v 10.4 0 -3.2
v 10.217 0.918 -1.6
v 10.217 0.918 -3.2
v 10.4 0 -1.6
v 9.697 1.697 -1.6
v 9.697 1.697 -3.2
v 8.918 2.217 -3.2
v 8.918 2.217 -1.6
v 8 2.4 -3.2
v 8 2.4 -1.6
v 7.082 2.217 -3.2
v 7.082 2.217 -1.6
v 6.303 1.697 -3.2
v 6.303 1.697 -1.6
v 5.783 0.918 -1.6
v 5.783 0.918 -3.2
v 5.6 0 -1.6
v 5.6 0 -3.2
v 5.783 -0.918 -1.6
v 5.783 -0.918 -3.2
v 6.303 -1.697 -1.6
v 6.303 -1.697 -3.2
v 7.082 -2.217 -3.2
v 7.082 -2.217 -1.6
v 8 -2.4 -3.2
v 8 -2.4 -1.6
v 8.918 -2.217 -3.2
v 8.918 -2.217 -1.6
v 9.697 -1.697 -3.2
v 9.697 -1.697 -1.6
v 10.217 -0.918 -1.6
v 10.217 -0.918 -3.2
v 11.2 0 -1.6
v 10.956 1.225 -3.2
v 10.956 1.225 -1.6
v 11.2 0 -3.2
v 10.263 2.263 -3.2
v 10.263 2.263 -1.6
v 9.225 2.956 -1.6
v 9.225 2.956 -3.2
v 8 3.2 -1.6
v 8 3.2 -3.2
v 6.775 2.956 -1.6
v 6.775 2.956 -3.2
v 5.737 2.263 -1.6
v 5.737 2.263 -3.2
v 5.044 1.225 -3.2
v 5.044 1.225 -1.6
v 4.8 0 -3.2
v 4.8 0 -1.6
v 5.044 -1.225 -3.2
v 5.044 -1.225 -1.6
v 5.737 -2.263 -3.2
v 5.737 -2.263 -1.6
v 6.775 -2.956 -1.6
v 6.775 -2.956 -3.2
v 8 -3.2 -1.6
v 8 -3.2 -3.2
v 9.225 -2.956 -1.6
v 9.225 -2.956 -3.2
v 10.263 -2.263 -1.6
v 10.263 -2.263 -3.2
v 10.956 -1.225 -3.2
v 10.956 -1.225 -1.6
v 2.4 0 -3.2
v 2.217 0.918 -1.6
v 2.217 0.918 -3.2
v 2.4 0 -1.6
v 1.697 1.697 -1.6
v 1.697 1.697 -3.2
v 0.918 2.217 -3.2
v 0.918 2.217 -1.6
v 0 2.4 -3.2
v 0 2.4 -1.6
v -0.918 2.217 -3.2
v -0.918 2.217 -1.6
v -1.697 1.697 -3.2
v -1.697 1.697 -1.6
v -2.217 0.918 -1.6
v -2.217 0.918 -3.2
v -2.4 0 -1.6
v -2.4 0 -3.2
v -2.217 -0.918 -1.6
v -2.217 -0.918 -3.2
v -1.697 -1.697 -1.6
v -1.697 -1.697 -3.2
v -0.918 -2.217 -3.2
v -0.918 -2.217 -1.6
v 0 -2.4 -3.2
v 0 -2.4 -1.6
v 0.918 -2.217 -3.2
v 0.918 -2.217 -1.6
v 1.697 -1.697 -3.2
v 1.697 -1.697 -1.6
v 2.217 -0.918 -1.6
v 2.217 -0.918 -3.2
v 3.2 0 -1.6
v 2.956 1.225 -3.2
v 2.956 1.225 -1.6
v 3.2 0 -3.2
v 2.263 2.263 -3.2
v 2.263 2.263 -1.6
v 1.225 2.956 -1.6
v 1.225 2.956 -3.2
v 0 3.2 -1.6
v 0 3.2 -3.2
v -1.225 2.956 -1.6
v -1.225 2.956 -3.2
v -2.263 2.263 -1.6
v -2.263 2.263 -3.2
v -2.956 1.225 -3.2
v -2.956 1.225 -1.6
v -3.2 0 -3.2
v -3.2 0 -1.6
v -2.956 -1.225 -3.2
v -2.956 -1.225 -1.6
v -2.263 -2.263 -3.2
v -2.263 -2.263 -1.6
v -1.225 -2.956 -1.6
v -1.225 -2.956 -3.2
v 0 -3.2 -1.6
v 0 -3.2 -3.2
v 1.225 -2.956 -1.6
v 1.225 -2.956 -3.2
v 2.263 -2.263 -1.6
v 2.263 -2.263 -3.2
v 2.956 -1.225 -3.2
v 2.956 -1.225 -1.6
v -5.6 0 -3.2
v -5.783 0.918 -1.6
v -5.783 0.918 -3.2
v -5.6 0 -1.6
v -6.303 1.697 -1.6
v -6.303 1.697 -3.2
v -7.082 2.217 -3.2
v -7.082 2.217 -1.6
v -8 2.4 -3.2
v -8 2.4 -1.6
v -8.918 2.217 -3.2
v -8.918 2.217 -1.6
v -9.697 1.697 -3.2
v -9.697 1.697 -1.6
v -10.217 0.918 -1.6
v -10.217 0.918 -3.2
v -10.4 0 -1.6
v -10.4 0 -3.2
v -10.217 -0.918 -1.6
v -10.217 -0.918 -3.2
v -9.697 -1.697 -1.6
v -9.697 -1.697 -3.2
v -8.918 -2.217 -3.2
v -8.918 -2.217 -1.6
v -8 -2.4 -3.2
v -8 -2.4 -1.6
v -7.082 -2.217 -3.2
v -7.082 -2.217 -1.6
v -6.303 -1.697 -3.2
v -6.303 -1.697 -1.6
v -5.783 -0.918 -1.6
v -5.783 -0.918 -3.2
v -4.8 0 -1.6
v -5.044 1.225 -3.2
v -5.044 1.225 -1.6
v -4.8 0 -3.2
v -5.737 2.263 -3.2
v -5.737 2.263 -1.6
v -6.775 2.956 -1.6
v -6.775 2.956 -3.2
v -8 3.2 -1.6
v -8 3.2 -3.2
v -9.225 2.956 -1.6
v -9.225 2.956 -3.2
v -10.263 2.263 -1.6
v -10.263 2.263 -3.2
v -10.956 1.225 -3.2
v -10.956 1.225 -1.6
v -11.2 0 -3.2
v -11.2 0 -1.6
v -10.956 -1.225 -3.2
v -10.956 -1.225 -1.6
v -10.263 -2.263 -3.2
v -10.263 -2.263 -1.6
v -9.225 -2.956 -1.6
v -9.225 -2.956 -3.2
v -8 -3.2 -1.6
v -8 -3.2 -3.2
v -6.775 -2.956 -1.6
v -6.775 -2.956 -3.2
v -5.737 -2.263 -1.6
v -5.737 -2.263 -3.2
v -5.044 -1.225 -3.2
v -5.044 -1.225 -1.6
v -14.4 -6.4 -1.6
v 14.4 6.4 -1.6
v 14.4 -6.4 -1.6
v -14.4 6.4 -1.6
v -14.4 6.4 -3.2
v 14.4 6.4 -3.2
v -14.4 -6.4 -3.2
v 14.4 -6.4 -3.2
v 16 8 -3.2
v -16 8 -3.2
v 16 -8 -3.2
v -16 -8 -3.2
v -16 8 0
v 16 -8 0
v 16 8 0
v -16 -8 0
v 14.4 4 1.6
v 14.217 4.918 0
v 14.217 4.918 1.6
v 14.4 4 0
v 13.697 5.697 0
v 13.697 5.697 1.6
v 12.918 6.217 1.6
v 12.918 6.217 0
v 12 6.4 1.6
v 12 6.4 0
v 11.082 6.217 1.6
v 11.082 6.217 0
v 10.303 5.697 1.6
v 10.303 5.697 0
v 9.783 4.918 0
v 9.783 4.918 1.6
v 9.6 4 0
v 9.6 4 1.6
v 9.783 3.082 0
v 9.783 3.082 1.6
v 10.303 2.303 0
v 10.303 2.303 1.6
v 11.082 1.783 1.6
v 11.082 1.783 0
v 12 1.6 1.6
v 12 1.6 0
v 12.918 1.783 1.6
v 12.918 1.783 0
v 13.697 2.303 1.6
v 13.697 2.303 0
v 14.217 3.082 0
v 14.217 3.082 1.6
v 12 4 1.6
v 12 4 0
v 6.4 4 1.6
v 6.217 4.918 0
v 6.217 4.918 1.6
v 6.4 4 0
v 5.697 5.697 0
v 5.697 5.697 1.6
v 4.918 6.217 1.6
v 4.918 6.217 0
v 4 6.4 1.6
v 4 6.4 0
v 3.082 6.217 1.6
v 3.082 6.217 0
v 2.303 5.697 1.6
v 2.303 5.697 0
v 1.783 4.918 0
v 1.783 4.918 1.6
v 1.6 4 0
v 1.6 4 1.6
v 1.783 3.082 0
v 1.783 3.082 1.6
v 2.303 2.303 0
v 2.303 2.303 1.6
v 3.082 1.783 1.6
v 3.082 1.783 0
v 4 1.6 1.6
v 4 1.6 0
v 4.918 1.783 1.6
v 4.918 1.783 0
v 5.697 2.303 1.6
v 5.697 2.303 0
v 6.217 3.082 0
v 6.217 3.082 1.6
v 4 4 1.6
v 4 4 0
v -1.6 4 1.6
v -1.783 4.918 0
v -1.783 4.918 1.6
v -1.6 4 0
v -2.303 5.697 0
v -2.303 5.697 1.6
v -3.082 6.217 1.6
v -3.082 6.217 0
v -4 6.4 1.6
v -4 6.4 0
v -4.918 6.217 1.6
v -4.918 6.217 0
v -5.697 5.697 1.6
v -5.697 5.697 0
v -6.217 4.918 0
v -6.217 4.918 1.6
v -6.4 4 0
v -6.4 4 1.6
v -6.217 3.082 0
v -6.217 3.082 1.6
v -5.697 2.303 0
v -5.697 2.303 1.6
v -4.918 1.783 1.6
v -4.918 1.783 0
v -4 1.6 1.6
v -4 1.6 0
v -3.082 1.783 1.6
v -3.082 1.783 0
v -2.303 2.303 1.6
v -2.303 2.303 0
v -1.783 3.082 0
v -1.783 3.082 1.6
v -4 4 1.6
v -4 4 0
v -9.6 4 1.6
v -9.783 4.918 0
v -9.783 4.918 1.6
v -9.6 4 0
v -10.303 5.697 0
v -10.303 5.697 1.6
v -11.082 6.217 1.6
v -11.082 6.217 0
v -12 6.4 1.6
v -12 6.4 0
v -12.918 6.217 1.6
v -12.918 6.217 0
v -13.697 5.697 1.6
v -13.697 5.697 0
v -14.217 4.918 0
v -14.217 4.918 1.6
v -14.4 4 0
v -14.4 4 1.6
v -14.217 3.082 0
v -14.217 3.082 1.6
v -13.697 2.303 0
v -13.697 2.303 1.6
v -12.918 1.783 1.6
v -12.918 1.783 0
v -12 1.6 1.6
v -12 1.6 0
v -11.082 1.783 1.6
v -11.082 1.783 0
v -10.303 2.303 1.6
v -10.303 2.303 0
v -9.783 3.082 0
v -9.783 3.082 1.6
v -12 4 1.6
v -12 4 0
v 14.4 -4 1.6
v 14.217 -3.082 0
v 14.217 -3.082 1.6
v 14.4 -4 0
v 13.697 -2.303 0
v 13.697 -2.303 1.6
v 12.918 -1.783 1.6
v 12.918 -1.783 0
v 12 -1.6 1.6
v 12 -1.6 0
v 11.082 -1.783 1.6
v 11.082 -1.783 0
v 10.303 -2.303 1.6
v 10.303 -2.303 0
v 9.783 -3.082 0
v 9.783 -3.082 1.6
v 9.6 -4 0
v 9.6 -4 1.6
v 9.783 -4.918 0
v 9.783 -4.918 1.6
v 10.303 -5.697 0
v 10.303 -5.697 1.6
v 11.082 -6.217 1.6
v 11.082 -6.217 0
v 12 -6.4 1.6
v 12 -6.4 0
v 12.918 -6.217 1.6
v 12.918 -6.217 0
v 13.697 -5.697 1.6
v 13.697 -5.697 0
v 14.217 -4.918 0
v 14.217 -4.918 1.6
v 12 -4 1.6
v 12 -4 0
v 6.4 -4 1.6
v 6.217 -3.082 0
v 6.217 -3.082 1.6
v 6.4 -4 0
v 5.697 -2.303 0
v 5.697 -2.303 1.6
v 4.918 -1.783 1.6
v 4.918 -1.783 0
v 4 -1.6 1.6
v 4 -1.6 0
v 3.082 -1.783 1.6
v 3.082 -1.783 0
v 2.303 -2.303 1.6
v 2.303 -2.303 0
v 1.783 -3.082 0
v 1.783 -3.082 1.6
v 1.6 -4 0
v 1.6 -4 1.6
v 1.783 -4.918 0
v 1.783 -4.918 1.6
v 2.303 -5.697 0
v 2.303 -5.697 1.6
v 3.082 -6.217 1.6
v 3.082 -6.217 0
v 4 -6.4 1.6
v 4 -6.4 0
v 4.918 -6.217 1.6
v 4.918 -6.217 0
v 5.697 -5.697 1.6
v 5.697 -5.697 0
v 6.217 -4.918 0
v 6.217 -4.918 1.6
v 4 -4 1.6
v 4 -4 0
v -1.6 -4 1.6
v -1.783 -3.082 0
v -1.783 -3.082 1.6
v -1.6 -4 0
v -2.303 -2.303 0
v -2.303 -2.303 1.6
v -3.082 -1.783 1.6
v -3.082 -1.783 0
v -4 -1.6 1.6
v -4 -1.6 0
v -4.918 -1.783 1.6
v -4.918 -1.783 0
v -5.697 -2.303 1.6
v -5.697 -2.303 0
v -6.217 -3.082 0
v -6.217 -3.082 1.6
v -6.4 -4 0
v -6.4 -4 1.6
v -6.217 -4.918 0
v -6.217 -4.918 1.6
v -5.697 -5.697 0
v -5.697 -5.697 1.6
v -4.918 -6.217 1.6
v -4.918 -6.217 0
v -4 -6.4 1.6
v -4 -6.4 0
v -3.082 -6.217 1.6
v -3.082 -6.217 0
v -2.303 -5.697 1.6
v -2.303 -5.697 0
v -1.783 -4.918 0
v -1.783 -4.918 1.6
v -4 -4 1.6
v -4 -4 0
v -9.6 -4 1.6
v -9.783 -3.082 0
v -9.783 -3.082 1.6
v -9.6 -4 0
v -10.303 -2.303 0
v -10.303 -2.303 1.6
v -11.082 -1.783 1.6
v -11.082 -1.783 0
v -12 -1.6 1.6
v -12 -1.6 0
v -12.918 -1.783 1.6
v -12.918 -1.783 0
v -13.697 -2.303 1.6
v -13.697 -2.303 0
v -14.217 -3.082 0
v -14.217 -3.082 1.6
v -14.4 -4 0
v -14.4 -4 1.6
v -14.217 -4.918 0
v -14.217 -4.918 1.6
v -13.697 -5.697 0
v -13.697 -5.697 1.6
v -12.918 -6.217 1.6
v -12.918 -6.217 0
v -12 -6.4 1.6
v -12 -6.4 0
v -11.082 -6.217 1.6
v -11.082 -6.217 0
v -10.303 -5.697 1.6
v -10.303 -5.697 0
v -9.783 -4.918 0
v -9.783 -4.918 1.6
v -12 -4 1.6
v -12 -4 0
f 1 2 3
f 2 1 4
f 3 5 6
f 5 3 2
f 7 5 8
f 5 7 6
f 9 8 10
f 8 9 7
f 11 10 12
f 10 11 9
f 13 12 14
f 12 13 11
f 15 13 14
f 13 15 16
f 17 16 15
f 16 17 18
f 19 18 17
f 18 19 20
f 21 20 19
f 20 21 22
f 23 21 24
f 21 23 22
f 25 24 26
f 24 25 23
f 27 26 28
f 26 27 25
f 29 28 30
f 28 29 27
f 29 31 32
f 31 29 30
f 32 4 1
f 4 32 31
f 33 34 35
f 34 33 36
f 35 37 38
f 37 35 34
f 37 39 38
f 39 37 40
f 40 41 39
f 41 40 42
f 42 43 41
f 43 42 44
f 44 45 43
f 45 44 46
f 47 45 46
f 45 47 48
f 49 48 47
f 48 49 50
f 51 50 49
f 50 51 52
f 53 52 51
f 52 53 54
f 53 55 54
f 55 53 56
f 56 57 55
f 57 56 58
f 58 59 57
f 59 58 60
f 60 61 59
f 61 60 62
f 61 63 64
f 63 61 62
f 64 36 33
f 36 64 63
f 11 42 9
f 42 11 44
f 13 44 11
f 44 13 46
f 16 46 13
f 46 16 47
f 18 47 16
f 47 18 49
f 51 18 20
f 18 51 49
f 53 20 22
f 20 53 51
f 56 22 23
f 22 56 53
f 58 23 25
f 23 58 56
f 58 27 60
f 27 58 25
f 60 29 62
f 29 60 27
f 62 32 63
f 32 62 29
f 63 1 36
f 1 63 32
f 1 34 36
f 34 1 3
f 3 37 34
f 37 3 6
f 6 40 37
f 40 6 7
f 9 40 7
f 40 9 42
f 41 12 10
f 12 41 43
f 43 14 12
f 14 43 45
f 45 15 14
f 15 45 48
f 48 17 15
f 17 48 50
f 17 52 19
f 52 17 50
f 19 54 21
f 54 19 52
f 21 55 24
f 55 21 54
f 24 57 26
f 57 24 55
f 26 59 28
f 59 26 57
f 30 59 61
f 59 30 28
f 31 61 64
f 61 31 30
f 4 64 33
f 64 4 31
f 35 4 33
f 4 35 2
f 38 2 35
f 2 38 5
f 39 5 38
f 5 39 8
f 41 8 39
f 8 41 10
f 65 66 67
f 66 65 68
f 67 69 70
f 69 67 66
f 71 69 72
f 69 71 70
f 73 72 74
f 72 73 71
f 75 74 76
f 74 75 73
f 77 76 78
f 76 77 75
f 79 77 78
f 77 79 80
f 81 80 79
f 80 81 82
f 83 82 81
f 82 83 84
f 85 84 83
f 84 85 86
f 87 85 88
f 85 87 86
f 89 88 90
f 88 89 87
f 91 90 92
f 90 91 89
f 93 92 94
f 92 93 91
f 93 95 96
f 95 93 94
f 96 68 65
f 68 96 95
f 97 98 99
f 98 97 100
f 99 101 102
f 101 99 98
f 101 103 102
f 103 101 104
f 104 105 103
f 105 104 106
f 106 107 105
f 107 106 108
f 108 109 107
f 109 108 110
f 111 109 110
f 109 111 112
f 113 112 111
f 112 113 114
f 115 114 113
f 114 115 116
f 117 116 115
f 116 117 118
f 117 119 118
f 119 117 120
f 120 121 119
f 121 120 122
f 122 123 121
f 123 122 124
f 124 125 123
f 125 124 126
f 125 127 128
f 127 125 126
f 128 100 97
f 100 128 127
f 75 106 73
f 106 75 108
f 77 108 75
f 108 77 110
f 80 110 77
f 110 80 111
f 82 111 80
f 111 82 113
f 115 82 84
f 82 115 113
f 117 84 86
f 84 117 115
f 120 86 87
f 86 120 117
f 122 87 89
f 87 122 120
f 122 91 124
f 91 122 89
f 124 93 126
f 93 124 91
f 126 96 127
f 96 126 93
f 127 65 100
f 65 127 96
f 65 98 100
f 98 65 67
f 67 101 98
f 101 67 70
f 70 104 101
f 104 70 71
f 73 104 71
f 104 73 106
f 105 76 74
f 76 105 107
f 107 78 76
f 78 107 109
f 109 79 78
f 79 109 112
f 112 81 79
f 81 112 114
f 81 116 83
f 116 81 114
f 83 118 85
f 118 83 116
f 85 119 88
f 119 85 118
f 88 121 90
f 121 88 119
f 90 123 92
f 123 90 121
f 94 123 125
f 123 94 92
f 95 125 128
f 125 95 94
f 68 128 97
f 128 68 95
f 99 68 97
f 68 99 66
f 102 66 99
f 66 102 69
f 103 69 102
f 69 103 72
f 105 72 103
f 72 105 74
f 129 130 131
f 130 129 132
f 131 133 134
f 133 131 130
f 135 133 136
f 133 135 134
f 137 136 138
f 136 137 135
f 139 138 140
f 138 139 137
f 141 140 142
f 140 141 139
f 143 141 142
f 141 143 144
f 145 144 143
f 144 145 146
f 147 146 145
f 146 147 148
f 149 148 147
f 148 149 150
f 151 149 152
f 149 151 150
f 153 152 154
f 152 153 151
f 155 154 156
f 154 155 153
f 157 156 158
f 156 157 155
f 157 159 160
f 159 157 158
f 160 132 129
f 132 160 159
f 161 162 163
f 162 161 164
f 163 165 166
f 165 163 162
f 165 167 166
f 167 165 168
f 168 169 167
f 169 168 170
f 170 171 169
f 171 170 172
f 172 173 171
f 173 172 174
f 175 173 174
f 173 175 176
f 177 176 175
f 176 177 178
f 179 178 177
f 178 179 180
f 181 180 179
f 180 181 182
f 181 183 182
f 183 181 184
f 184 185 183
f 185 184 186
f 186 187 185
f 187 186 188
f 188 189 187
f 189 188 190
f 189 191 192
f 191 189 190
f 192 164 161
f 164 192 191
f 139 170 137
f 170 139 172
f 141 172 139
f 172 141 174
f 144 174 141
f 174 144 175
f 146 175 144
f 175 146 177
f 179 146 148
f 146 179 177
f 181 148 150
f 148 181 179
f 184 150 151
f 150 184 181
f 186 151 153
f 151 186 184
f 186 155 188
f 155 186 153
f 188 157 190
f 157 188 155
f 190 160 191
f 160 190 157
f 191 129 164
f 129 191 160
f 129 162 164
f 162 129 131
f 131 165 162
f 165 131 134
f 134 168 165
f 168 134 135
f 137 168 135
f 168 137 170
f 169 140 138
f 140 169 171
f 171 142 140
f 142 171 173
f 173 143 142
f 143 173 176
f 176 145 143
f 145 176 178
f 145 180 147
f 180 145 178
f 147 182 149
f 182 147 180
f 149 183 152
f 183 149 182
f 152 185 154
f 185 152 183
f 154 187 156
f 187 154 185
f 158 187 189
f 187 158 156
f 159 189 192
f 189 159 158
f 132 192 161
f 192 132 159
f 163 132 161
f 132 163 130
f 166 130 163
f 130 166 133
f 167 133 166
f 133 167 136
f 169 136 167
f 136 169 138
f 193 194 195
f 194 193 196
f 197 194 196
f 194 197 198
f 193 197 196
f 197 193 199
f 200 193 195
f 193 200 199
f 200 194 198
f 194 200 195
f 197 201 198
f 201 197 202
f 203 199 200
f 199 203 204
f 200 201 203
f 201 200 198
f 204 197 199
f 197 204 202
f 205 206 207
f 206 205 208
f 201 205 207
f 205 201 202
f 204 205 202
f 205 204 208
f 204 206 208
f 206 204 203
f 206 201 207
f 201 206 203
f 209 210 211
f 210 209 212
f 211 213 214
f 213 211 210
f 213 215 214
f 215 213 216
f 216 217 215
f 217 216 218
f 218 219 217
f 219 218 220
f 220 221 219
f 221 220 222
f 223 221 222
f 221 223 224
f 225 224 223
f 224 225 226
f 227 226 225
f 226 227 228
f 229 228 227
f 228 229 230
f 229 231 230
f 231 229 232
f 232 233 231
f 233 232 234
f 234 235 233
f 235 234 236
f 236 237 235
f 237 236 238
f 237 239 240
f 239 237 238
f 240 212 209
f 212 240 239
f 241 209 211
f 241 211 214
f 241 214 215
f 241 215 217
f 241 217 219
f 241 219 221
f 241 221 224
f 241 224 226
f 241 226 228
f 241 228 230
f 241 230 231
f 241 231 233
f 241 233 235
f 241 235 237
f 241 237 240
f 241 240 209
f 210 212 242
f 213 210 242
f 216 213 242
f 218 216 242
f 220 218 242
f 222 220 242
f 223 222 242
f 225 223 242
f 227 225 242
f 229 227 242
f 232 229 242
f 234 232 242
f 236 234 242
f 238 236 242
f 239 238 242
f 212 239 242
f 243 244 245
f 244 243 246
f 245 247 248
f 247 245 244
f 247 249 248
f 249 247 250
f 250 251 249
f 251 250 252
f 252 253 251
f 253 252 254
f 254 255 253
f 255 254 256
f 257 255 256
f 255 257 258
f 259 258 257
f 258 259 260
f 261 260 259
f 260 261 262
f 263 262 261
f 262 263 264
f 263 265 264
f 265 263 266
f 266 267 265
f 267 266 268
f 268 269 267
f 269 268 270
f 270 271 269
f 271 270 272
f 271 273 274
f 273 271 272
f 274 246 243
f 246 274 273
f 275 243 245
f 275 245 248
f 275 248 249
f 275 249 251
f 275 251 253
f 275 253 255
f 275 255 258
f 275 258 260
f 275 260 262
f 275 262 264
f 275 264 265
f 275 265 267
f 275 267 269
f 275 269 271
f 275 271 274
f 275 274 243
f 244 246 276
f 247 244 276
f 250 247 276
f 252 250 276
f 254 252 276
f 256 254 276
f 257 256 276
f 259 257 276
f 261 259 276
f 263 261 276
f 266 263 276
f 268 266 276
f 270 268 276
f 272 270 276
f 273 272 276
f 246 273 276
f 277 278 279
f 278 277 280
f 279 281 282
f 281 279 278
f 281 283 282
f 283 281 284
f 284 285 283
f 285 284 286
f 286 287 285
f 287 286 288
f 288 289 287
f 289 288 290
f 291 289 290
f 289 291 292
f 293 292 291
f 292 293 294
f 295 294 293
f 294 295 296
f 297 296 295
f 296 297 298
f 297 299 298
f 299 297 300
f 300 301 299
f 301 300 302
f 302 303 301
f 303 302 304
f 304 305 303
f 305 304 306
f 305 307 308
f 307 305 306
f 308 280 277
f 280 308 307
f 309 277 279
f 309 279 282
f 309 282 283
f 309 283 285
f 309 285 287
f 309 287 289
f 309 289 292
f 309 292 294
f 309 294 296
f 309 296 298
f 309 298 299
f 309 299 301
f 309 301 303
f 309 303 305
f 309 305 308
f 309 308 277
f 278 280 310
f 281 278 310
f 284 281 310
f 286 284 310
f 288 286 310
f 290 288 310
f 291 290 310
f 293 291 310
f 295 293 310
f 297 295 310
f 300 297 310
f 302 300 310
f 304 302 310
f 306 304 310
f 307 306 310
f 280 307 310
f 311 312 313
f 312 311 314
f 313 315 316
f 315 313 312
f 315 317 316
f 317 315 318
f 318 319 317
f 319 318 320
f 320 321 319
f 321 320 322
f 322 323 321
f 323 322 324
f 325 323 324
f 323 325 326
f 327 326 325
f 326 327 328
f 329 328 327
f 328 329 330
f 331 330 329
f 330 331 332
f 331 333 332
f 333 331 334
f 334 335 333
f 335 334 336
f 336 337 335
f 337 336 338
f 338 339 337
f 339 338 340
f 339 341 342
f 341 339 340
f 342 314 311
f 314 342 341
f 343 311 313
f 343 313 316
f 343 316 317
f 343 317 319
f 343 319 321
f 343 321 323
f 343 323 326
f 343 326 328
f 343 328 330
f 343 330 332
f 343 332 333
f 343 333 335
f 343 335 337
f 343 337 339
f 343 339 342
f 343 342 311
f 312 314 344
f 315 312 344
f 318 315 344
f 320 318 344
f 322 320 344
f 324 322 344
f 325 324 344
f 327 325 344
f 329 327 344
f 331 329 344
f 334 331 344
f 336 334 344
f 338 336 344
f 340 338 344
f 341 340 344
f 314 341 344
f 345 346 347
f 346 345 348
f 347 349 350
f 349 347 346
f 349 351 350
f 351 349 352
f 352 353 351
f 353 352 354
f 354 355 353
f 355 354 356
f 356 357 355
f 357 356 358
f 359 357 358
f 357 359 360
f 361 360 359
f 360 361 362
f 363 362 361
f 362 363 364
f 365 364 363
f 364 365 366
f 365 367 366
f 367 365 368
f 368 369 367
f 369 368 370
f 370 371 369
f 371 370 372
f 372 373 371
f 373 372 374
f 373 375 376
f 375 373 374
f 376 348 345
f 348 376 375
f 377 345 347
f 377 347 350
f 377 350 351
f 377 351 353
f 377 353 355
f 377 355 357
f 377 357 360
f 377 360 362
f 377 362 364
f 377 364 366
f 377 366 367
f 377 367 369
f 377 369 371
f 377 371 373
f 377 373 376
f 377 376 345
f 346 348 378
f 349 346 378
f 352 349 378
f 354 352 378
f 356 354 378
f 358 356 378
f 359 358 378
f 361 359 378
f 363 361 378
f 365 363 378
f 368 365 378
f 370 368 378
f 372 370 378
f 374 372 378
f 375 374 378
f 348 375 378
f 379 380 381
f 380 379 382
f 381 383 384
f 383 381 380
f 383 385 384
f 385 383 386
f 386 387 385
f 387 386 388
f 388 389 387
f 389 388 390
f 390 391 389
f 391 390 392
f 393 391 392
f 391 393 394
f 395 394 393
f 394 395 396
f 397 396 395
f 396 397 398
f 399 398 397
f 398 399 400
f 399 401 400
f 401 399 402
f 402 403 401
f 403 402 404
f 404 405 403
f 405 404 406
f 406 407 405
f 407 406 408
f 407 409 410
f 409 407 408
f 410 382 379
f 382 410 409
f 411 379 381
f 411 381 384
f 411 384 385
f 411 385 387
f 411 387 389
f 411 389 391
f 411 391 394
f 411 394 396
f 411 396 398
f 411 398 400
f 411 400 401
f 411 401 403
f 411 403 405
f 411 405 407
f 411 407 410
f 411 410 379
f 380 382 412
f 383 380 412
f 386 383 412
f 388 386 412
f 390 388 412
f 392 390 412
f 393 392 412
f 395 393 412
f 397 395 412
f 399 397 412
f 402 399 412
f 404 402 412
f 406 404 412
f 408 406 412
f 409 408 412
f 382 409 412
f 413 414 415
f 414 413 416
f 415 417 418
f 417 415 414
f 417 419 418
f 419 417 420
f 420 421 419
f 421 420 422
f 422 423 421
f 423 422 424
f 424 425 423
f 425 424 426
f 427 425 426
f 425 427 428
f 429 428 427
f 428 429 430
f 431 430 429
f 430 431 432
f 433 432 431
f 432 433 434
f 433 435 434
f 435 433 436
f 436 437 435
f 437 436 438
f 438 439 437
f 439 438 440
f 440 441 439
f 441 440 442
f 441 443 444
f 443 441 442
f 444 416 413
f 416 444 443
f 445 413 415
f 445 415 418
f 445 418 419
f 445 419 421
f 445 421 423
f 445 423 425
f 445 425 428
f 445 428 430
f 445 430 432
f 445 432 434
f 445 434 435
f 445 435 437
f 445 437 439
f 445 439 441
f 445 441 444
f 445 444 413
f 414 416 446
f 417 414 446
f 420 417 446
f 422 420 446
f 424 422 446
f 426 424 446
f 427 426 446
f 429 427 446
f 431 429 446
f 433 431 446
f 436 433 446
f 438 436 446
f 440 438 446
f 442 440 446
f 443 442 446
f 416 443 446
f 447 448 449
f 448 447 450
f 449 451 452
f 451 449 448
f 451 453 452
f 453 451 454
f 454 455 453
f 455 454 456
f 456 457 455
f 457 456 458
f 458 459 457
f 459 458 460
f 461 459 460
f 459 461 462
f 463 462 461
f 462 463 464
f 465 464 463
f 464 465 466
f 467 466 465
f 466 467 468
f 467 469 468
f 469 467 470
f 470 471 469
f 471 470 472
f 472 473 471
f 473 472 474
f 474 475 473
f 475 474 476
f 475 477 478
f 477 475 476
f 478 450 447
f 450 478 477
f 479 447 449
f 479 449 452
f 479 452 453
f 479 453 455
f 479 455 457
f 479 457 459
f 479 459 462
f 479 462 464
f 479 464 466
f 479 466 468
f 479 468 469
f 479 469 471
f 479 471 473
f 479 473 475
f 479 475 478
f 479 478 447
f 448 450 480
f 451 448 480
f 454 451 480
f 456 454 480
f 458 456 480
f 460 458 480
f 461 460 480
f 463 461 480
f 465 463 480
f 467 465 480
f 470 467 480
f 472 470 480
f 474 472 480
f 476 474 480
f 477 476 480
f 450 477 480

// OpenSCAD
// file: ../p/4-4ring3.scad
use <../lib.scad>
$fa=1; $fs=0.2;
function ldraw_lib__4_4ring3(realsolid=false) = [
// 0 Ring  3 x 1.0
// 0 Name: 4-4ring3.dat
// 0 Author: James Jessiman
// 0 !LDRAW_ORG Primitive UPDATE 2009-01
// 0 !LICENSE Licensed under CC BY 2.0 and CC BY 4.0 : see CAreadme.txt
// 
// 0 BFC CERTIFY CCW
  [0,"BFC","CERTIFY"],
  [0,"BFC","CCW"],
// 
// 0 !HISTORY 1998-12-15 [PTadmin] Official Update 1998-10
// 0 !HISTORY 2002-04-05 [hafhead] Added BFC statement
// 0 !HISTORY 2002-04-25 [PTadmin] Official Update 2002-02
// 0 !HISTORY 2007-06-24 [PTadmin] Header formatted for Contributor Agreement
// 0 !HISTORY 2008-07-01 [PTadmin] Official Update 2008-01
// 0 !HISTORY 2008-08-26 [cwdee] Switch polygon winding and rename
// 0 !HISTORY 2009-05-02 [PTadmin] Official Update 2009-01
// 
// 
// 4 16 -1.5308 0 3.6956 -1.1481 0 2.7717 0 0 3 0 0 4
  [4,16,-1.5308,0,3.6956,-1.1481,0,2.7717,0,0,3,0,0,4],
// 4 16 -2.8284 0 2.8284 -2.1213 0 2.1213 -1.1481 0 2.7717 -1.5308 0 3.6956
  [4,16,-2.8284,0,2.8284,-2.1213,0,2.1213,-1.1481,0,2.7717,-1.5308,0,3.6956],
// 4 16 -3.6956 0 1.5308 -2.7717 0 1.1481 -2.1213 0 2.1213 -2.8284 0 2.8284
  [4,16,-3.6956,0,1.5308,-2.7717,0,1.1481,-2.1213,0,2.1213,-2.8284,0,2.8284],
// 4 16 -4 0 0 -3 0 0 -2.7717 0 1.1481 -3.6956 0 1.5308
  [4,16,-4,0,0,-3,0,0,-2.7717,0,1.1481,-3.6956,0,1.5308],
// 4 16 -3.6956 0 -1.5308 -2.7717 0 -1.1481 -3 0 0 -4 0 0
  [4,16,-3.6956,0,-1.5308,-2.7717,0,-1.1481,-3,0,0,-4,0,0],
// 4 16 -2.8284 0 -2.8284 -2.1213 0 -2.1213 -2.7717 0 -1.1481 -3.6956 0 -1.5308
  [4,16,-2.8284,0,-2.8284,-2.1213,0,-2.1213,-2.7717,0,-1.1481,-3.6956,0,-1.5308],
// 4 16 -1.5308 0 -3.6956 -1.1481 0 -2.7717 -2.1213 0 -2.1213 -2.8284 0 -2.8284
  [4,16,-1.5308,0,-3.6956,-1.1481,0,-2.7717,-2.1213,0,-2.1213,-2.8284,0,-2.8284],
// 4 16 0 0 -4 0 0 -3 -1.1481 0 -2.7717 -1.5308 0 -3.6956
  [4,16,0,0,-4,0,0,-3,-1.1481,0,-2.7717,-1.5308,0,-3.6956],
// 4 16 1.5308 0 -3.6956 1.1481 0 -2.7717 0 0 -3 0 0 -4
  [4,16,1.5308,0,-3.6956,1.1481,0,-2.7717,0,0,-3,0,0,-4],
// 4 16 2.8284 0 -2.8284 2.1213 0 -2.1213 1.1481 0 -2.7717 1.5308 0 -3.6956
  [4,16,2.8284,0,-2.8284,2.1213,0,-2.1213,1.1481,0,-2.7717,1.5308,0,-3.6956],
// 4 16 3.6956 0 -1.5308 2.7717 0 -1.1481 2.1213 0 -2.1213 2.8284 0 -2.8284
  [4,16,3.6956,0,-1.5308,2.7717,0,-1.1481,2.1213,0,-2.1213,2.8284,0,-2.8284],
// 4 16 4 0 0 3 0 0 2.7717 0 -1.1481 3.6956 0 -1.5308
  [4,16,4,0,0,3,0,0,2.7717,0,-1.1481,3.6956,0,-1.5308],
// 4 16 3.6956 0 1.5308 2.7717 0 1.1481 3 0 0 4 0 0
  [4,16,3.6956,0,1.5308,2.7717,0,1.1481,3,0,0,4,0,0],
// 4 16 2.8284 0 2.8284 2.1213 0 2.1213 2.7717 0 1.1481 3.6956 0 1.5308
  [4,16,2.8284,0,2.8284,2.1213,0,2.1213,2.7717,0,1.1481,3.6956,0,1.5308],
// 4 16 1.5308 0 3.6956 1.1481 0 2.7717 2.1213 0 2.1213 2.8284 0 2.8284
  [4,16,1.5308,0,3.6956,1.1481,0,2.7717,2.1213,0,2.1213,2.8284,0,2.8284],
// 4 16 0 0 4 0 0 3 1.1481 0 2.7717 1.5308 0 3.6956
  [4,16,0,0,4,0,0,3,1.1481,0,2.7717,1.5308,0,3.6956],
// 0
];
module ldraw_lib__4_4ring3(step=0, col=false, unit=2/5, alt=false, line=0.2, solid=!$preview)
    makepoly(ldraw_lib__4_4ring3(solid), step=step, col=col, unit=unit, alt=alt, line=line, solid=solid);
ldraw_lib__4_4ring3(line=0.2);
// file: ../p/4-4edge.scad
use <../lib.scad>
function ldraw_lib__4_4edge() = [
// 0 Circle 1.0
// 0 Name: 4-4edge.dat
// 0 Author: James Jessiman
// 0 !LDRAW_ORG Primitive UPDATE 2017-01
// 0 !LICENSE Licensed under CC BY 2.0 and CC BY 4.0 : see CAreadme.txt
// 
// 0 BFC CERTIFY CCW
  [0,"BFC","CERTIFY"],
  [0,"BFC","CCW"],
// 
// 0 !HISTORY 1998-12-15 [PTadmin] Official Update 1998-10
// 0 !HISTORY 2005-12-28 [PTadmin] Official Update 2005-01
// 0 !HISTORY 2007-06-24 [PTadmin] Header formatted for Contributor Agreement
// 0 !HISTORY 2008-07-01 [PTadmin] Official Update 2008-01
// 0 !HISTORY 2017-01-15 [Steffen] BFCed
// 0 !HISTORY 2017-12-30 [PTadmin] Official Update 2017-01
// 
// 
// 2 24 1 0 0 0.9239 0 0.3827
  [2,24,1,0,0,0.9239,0,0.3827],
// 2 24 0.9239 0 0.3827 0.7071 0 0.7071
  [2,24,0.9239,0,0.3827,0.7071,0,0.7071],
// 2 24 0.7071 0 0.7071 0.3827 0 0.9239
  [2,24,0.7071,0,0.7071,0.3827,0,0.9239],
// 2 24 0.3827 0 0.9239 0 0 1
  [2,24,0.3827,0,0.9239,0,0,1],
// 2 24 0 0 1 -0.3827 0 0.9239
  [2,24,0,0,1,-0.3827,0,0.9239],
// 2 24 -0.3827 0 0.9239 -0.7071 0 0.7071
  [2,24,-0.3827,0,0.9239,-0.7071,0,0.7071],
// 2 24 -0.7071 0 0.7071 -0.9239 0 0.3827
  [2,24,-0.7071,0,0.7071,-0.9239,0,0.3827],
// 2 24 -0.9239 0 0.3827 -1 0 -0
  [2,24,-0.9239,0,0.3827,-1,0,-0],
// 2 24 -1 0 -0 -0.9239 0 -0.3827
  [2,24,-1,0,-0,-0.9239,0,-0.3827],
// 2 24 -0.9239 0 -0.3827 -0.7071 0 -0.7071
  [2,24,-0.9239,0,-0.3827,-0.7071,0,-0.7071],
// 2 24 -0.7071 0 -0.7071 -0.3827 0 -0.9239
  [2,24,-0.7071,0,-0.7071,-0.3827,0,-0.9239],
// 2 24 -0.3827 0 -0.9239 0 0 -1
  [2,24,-0.3827,0,-0.9239,0,0,-1],
// 2 24 0 0 -1 0.3827 0 -0.9239
  [2,24,0,0,-1,0.3827,0,-0.9239],
// 2 24 0.3827 0 -0.9239 0.7071 0 -0.7071
  [2,24,0.3827,0,-0.9239,0.7071,0,-0.7071],
// 2 24 0.7071 0 -0.7071 0.9239 0 -0.3827
  [2,24,0.7071,0,-0.7071,0.9239,0,-0.3827],
// 2 24 0.9239 0 -0.3827 1 0 0
  [2,24,0.9239,0,-0.3827,1,0,0],
];
module ldraw_lib__4_4edge(step=0, col=false, unit=2/5, alt=false, line=0.2, solid=!$preview)
    makepoly(ldraw_lib__4_4edge(), step=step, col=col, unit=unit, alt=alt, line=line, solid=solid);
ldraw_lib__4_4edge(line=0.2);
// file: ../p/4-4disc.scad
use <../lib.scad>
function ldraw_lib__4_4disc() = [
// 0 Disc 1.0
// 0 Name: 4-4disc.dat
// 0 Author: James Jessiman
// 0 !LDRAW_ORG Primitive UPDATE 2002-02
// 0 !LICENSE Licensed under CC BY 2.0 and CC BY 4.0 : see CAreadme.txt
// 
// 0 BFC CERTIFY CCW
  [0,"BFC","CERTIFY"],
  [0,"BFC","CCW"],
// 
// 0 !HISTORY 1998-12-15 [PTadmin] Official Update 1998-10
// 0 !HISTORY 2002-03-23 [sbliss] Added BFC statement
// 0 !HISTORY 2002-04-25 [PTadmin] Official Update 2002-02
// 0 !HISTORY 2007-06-24 [PTadmin] Header formatted for Contributor Agreement
// 0 !HISTORY 2008-07-01 [PTadmin] Official Update 2008-01
// 
// 
// 3 16 0 0 0 1 0 0 0.9239 0 0.3827
  [3,16,0,0,0,1,0,0,0.9239,0,0.3827],
// 3 16 0 0 0 0.9239 0 0.3827 0.7071 0 0.7071
  [3,16,0,0,0,0.9239,0,0.3827,0.7071,0,0.7071],
// 3 16 0 0 0 0.7071 0 0.7071 0.3827 0 0.9239
  [3,16,0,0,0,0.7071,0,0.7071,0.3827,0,0.9239],
// 3 16 0 0 0 0.3827 0 0.9239 0 0 1
  [3,16,0,0,0,0.3827,0,0.9239,0,0,1],
// 3 16 0 0 0 0 0 1 -0.3827 0 0.9239
  [3,16,0,0,0,0,0,1,-0.3827,0,0.9239],
// 3 16 0 0 0 -0.3827 0 0.9239 -0.7071 0 0.7071
  [3,16,0,0,0,-0.3827,0,0.9239,-0.7071,0,0.7071],
// 3 16 0 0 0 -0.7071 0 0.7071 -0.9239 0 0.3827
  [3,16,0,0,0,-0.7071,0,0.7071,-0.9239,0,0.3827],
// 3 16 0 0 0 -0.9239 0 0.3827 -1 0 -0
  [3,16,0,0,0,-0.9239,0,0.3827,-1,0,-0],
// 3 16 0 0 0 -1 0 -0 -0.9239 0 -0.3827
  [3,16,0,0,0,-1,0,-0,-0.9239,0,-0.3827],
// 3 16 0 0 0 -0.9239 0 -0.3827 -0.7071 0 -0.7071
  [3,16,0,0,0,-0.9239,0,-0.3827,-0.7071,0,-0.7071],
// 3 16 0 0 0 -0.7071 0 -0.7071 -0.3827 0 -0.9239
  [3,16,0,0,0,-0.7071,0,-0.7071,-0.3827,0,-0.9239],
// 3 16 0 0 0 -0.3827 0 -0.9239 0 0 -1
  [3,16,0,0,0,-0.3827,0,-0.9239,0,0,-1],
// 3 16 0 0 0 0 0 -1 0.3827 0 -0.9239
  [3,16,0,0,0,0,0,-1,0.3827,0,-0.9239],
// 3 16 0 0 0 0.3827 0 -0.9239 0.7071 0 -0.7071
  [3,16,0,0,0,0.3827,0,-0.9239,0.7071,0,-0.7071],
// 3 16 0 0 0 0.7071 0 -0.7071 0.9239 0 -0.3827
  [3,16,0,0,0,0.7071,0,-0.7071,0.9239,0,-0.3827],
// 3 16 0 0 0 0.9239 0 -0.3827 1 0 0
  [3,16,0,0,0,0.9239,0,-0.3827,1,0,0],
// 0
];
module ldraw_lib__4_4disc(step=0, col=false, unit=2/5, alt=false, line=0.2, solid=!$preview)
    makepoly(ldraw_lib__4_4disc(), step=step, col=col, unit=unit, alt=alt, line=line, solid=solid);
ldraw_lib__4_4disc(line=0.2);
// file: ../p/4-4cyli.scad
use <../lib.scad>
$fa=1; $fs=0.2;
function ldraw_lib__4_4cyli(realsolid=false) = [
// 0 Cylinder 1.0
// 0 Name: 4-4cyli.dat
// 0 Author: James Jessiman
// 0 !LDRAW_ORG Primitive UPDATE 2005-01
// 0 !LICENSE Licensed under CC BY 2.0 and CC BY 4.0 : see CAreadme.txt
// 
// 0 BFC CERTIFY CCW
  [0,"BFC","CERTIFY"],
  [0,"BFC","CCW"],
// 
// 0 !HISTORY 1998-12-15 [PTadmin] Official Update 1998-10
// 0 !HISTORY 2002-03-23 [sbliss] Added BFC statement; merged headers from files in distributions LDraw 0.27 and Complete.
// 0 !HISTORY 2002-04-25 [PTadmin] Official Update 2002-02
// 0 !HISTORY 2004-12-14 [guyvivan] BFC CCW
// 0 !HISTORY 2005-12-28 [PTadmin] Official Update 2005-01
// 0 !HISTORY 2007-06-24 [PTadmin] Header formatted for Contributor Agreement
// 0 !HISTORY 2008-07-01 [PTadmin] Official Update 2008-01
// 
// 
// 4 16 1 1 0 0.9239 1 0.3827 0.9239 0 0.3827 1 0 0
  [4,16,1,1,0,0.9239,1,0.3827,0.9239,0,0.3827,1,0,0],
// 5 24 1 0 0 1 1 0 0.9239 0 0.3827 0.9239 0 -0.3827
  [5,24,1,0,0,1,1,0,0.9239,0,0.3827,0.9239,0,-0.3827],
// 4 16 0.9239 1 0.3827 0.7071 1 0.7071 0.7071 0 0.7071 0.9239 0 0.3827
  [4,16,0.9239,1,0.3827,0.7071,1,0.7071,0.7071,0,0.7071,0.9239,0,0.3827],
// 5 24 0.9239 0 0.3827 0.9239 1 0.3827 0.7071 0 0.7071 1 0 0
  [5,24,0.9239,0,0.3827,0.9239,1,0.3827,0.7071,0,0.7071,1,0,0],
// 4 16 0.7071 1 0.7071 0.3827 1 0.9239 0.3827 0 0.9239 0.7071 0 0.7071
  [4,16,0.7071,1,0.7071,0.3827,1,0.9239,0.3827,0,0.9239,0.7071,0,0.7071],
// 5 24 0.7071 0 0.7071 0.7071 1 0.7071 0.3827 0 0.9239 0.9239 0 0.3827
  [5,24,0.7071,0,0.7071,0.7071,1,0.7071,0.3827,0,0.9239,0.9239,0,0.3827],
// 4 16 0.3827 1 0.9239 0 1 1 0 0 1 0.3827 0 0.9239
  [4,16,0.3827,1,0.9239,0,1,1,0,0,1,0.3827,0,0.9239],
// 5 24 0.3827 0 0.9239 0.3827 1 0.9239 0 0 1 0.7071 0 0.7071
  [5,24,0.3827,0,0.9239,0.3827,1,0.9239,0,0,1,0.7071,0,0.7071],
// 4 16 0 1 1 -0.3827 1 0.9239 -0.3827 0 0.9239 0 0 1
  [4,16,0,1,1,-0.3827,1,0.9239,-0.3827,0,0.9239,0,0,1],
// 5 24 0 0 1 0 1 1 -0.3827 0 0.9239 0.3827 0 0.9239
  [5,24,0,0,1,0,1,1,-0.3827,0,0.9239,0.3827,0,0.9239],
// 4 16 -0.3827 1 0.9239 -0.7071 1 0.7071 -0.7071 0 0.7071 -0.3827 0 0.9239
  [4,16,-0.3827,1,0.9239,-0.7071,1,0.7071,-0.7071,0,0.7071,-0.3827,0,0.9239],
// 5 24 -0.3827 0 0.9239 -0.3827 1 0.9239 -0.7071 0 0.7071 0 0 1
  [5,24,-0.3827,0,0.9239,-0.3827,1,0.9239,-0.7071,0,0.7071,0,0,1],
// 4 16 -0.7071 1 0.7071 -0.9239 1 0.3827 -0.9239 0 0.3827 -0.7071 0 0.7071
  [4,16,-0.7071,1,0.7071,-0.9239,1,0.3827,-0.9239,0,0.3827,-0.7071,0,0.7071],
// 5 24 -0.7071 0 0.7071 -0.7071 1 0.7071 -0.9239 0 0.3827 -0.3827 0 0.9239
  [5,24,-0.7071,0,0.7071,-0.7071,1,0.7071,-0.9239,0,0.3827,-0.3827,0,0.9239],
// 4 16 -0.9239 1 0.3827 -1 1 0 -1 0 0 -0.9239 0 0.3827
  [4,16,-0.9239,1,0.3827,-1,1,0,-1,0,0,-0.9239,0,0.3827],
// 5 24 -0.9239 0 0.3827 -0.9239 1 0.3827 -1 0 0 -0.7071 0 0.7071
  [5,24,-0.9239,0,0.3827,-0.9239,1,0.3827,-1,0,0,-0.7071,0,0.7071],
// 4 16 -1 1 0 -0.9239 1 -0.3827 -0.9239 0 -0.3827 -1 0 0
  [4,16,-1,1,0,-0.9239,1,-0.3827,-0.9239,0,-0.3827,-1,0,0],
// 5 24 -1 0 0 -1 1 0 -0.9239 0 -0.3827 -0.9239 0 0.3827
  [5,24,-1,0,0,-1,1,0,-0.9239,0,-0.3827,-0.9239,0,0.3827],
// 4 16 -0.9239 1 -0.3827 -0.7071 1 -0.7071 -0.7071 0 -0.7071 -0.9239 0 -0.3827
  [4,16,-0.9239,1,-0.3827,-0.7071,1,-0.7071,-0.7071,0,-0.7071,-0.9239,0,-0.3827],
// 5 24 -0.9239 0 -0.3827 -0.9239 1 -0.3827 -0.7071 0 -0.7071 -1 0 0
  [5,24,-0.9239,0,-0.3827,-0.9239,1,-0.3827,-0.7071,0,-0.7071,-1,0,0],
// 4 16 -0.7071 1 -0.7071 -0.3827 1 -0.9239 -0.3827 0 -0.9239 -0.7071 0 -0.7071
  [4,16,-0.7071,1,-0.7071,-0.3827,1,-0.9239,-0.3827,0,-0.9239,-0.7071,0,-0.7071],
// 5 24 -0.7071 0 -0.7071 -0.7071 1 -0.7071 -0.3827 0 -0.9239 -0.9239 0 -0.3827
  [5,24,-0.7071,0,-0.7071,-0.7071,1,-0.7071,-0.3827,0,-0.9239,-0.9239,0,-0.3827],
// 4 16 -0.3827 1 -0.9239 0 1 -1 0 0 -1 -0.3827 0 -0.9239
  [4,16,-0.3827,1,-0.9239,0,1,-1,0,0,-1,-0.3827,0,-0.9239],
// 5 24 -0.3827 0 -0.9239 -0.3827 1 -0.9239 0 0 -1 -0.7071 0 -0.7071
  [5,24,-0.3827,0,-0.9239,-0.3827,1,-0.9239,0,0,-1,-0.7071,0,-0.7071],
// 4 16 0 1 -1 0.3827 1 -0.9239 0.3827 0 -0.9239 0 0 -1
  [4,16,0,1,-1,0.3827,1,-0.9239,0.3827,0,-0.9239,0,0,-1],
// 5 24 0 0 -1 0 1 -1 0.3827 0 -0.9239 -0.3827 0 -0.9239
  [5,24,0,0,-1,0,1,-1,0.3827,0,-0.9239,-0.3827,0,-0.9239],
// 4 16 0.3827 1 -0.9239 0.7071 1 -0.7071 0.7071 0 -0.7071 0.3827 0 -0.9239
  [4,16,0.3827,1,-0.9239,0.7071,1,-0.7071,0.7071,0,-0.7071,0.3827,0,-0.9239],
// 5 24 0.3827 0 -0.9239 0.3827 1 -0.9239 0.7071 0 -0.7071 0 0 -1
  [5,24,0.3827,0,-0.9239,0.3827,1,-0.9239,0.7071,0,-0.7071,0,0,-1],
// 4 16 0.7071 1 -0.7071 0.9239 1 -0.3827 0.9239 0 -0.3827 0.7071 0 -0.7071
  [4,16,0.7071,1,-0.7071,0.9239,1,-0.3827,0.9239,0,-0.3827,0.7071,0,-0.7071],
// 5 24 0.7071 0 -0.7071 0.7071 1 -0.7071 0.9239 0 -0.3827 0.3827 0 -0.9239
  [5,24,0.7071,0,-0.7071,0.7071,1,-0.7071,0.9239,0,-0.3827,0.3827,0,-0.9239],
// 4 16 0.9239 1 -0.3827 1 1 0 1 0 0 0.9239 0 -0.3827
  [4,16,0.9239,1,-0.3827,1,1,0,1,0,0,0.9239,0,-0.3827],
// 5 24 0.9239 0 -0.3827 0.9239 1 -0.3827 1 0 0 0.7071 0 -0.7071
  [5,24,0.9239,0,-0.3827,0.9239,1,-0.3827,1,0,0,0.7071,0,-0.7071],
// 0
];
module ldraw_lib__4_4cyli(step=0, col=false, unit=2/5, alt=false, line=0.2, solid=!$preview)
    makepoly(ldraw_lib__4_4cyli(solid), step=step, col=col, unit=unit, alt=alt, line=line, solid=solid);
ldraw_lib__4_4cyli(line=0.2);
// file: ../p/stud4.scad
use <../lib.scad>
use <4-4cyli.scad>
use <4-4edge.scad>
use <4-4ring3.scad>
function ldraw_lib__stud4() = [
// 0 Stud Tube Open
// 0 Name: stud4.dat
// 0 Author: James Jessiman
// 0 !LDRAW_ORG Primitive UPDATE 2009-02
// 0 !LICENSE Licensed under CC BY 4.0 : see CAreadme.txt
// 
// 0 BFC CERTIFY CCW
  [0,"BFC","CERTIFY"],
  [0,"BFC","CCW"],
// 
// 0 !HISTORY 1999-07-05 [PTadmin] Official Update 1999-05
// 0 !HISTORY 2002-04-04 [sbliss] Modified for BFC compliance
// 0 !HISTORY 2002-04-25 [PTadmin] Official Update 2002-02
// 0 !HISTORY 2007-06-24 [PTadmin] Header formatted for Contributor Agreement
// 0 !HISTORY 2008-07-01 [PTadmin] Official Update 2008-01
// 0 !HISTORY 2009-06-21 [cwdee] Update ring references to 4-4ring
// 0 !HISTORY 2009-09-03 [PTadmin] Official Update 2009-02
// 
// 
// 1 16 0 -4 0 6 0 0 0 1 0 0 0 6 4-4edge.dat
  [1,16,0,-4,0,6,0,0,0,1,0,0,0,6, ldraw_lib__4_4edge()],
// 1 16 0 -4 0 8 0 0 0 1 0 0 0 8 4-4edge.dat
  [1,16,0,-4,0,8,0,0,0,1,0,0,0,8, ldraw_lib__4_4edge()],
// 1 16 0 0 0 6 0 0 0 1 0 0 0 6 4-4edge.dat
  [1,16,0,0,0,6,0,0,0,1,0,0,0,6, ldraw_lib__4_4edge()],
// 1 16 0 0 0 8 0 0 0 1 0 0 0 8 4-4edge.dat
  [1,16,0,0,0,8,0,0,0,1,0,0,0,8, ldraw_lib__4_4edge()],
// 0 BFC INVERTNEXT
  [0,"BFC","INVERTNEXT"],
// 1 16 0 -4 0 6 0 0 0 4 0 0 0 6 4-4cyli.dat
  [1,16,0,-4,0,6,0,0,0,4,0,0,0,6, ldraw_lib__4_4cyli()],
// 1 16 0 -4 0 8 0 0 0 4 0 0 0 8 4-4cyli.dat
  [1,16,0,-4,0,8,0,0,0,4,0,0,0,8, ldraw_lib__4_4cyli()],
// 1 16 0 -4 0 2 0 0 0 1 0 0 0 2 4-4ring3.dat
  [1,16,0,-4,0,2,0,0,0,1,0,0,0,2, ldraw_lib__4_4ring3()],
  [-1,16,0,0,0,2,0,0,0,-1,0,0,0,2, ldraw_lib__4_4ring3()],
// 0
];
module ldraw_lib__stud4(step=0, col=false, unit=2/5, alt=false, line=0.2, solid=!$preview)
    makepoly(ldraw_lib__stud4(), step=step, col=col, unit=unit, alt=alt, line=line, solid=solid);
ldraw_lib__stud4(line=0.2);
// file: ../p/stud.scad
use <../lib.scad>
use <4-4cyli.scad>
use <4-4disc.scad>
use <4-4edge.scad>
function ldraw_lib__stud() = [
// 0 Stud
// 0 Name: stud.dat
// 0 Author: James Jessiman
// 0 !LDRAW_ORG Primitive UPDATE 2012-01
// 0 !LICENSE Licensed under CC BY 4.0 : see CAreadme.txt
// 
// 0 BFC CERTIFY CCW
  [0,"BFC","CERTIFY"],
  [0,"BFC","CCW"],
// 
// 0 !HISTORY 2002-04-04 [sbliss] Modified for BFC compliance
// 0 !HISTORY 2002-04-25 [PTadmin] Official Update 2002-02
// 0 !HISTORY 2007-06-24 [PTadmin] Header formatted for Contributor Agreement
// 0 !HISTORY 2008-07-01 [PTadmin] Official Update 2008-01
// 0 !HISTORY 2012-02-16 [Philo] Changed to CCW
// 0 !HISTORY 2012-03-30 [PTadmin] Official Update 2012-01
// 
// 
// 1 16 0 0 0 6 0 0 0 1 0 0 0 6 4-4edge.dat
  [1,16,0,0,0,6,0,0,0,1,0,0,0,6, ldraw_lib__4_4edge()],
// 1 16 0 -4 0 6 0 0 0 1 0 0 0 6 4-4edge.dat
  [1,16,0,-4,0,6,0,0,0,1,0,0,0,6, ldraw_lib__4_4edge()],
// 1 16 0 0 0 6 0 0 0 -4 0 0 0 6 4-4cyli.dat
  [1,16,0,0,0,6,0,0,0,-4,0,0,0,6, ldraw_lib__4_4cyli()],
// 1 16 0 -4 0 6 0 0 0 1 0 0 0 6 4-4disc.dat
  [1,16,0,-4,0,6,0,0,0,1,0,0,0,6, ldraw_lib__4_4disc()],
  [-1,16,0,0,0,6,0,0,0,-1,0,0,0,6, ldraw_lib__4_4disc()],
];
module ldraw_lib__stud(step=0, col=false, unit=2/5, alt=false, line=0.2, solid=!$preview)
    makepoly(ldraw_lib__stud(), step=step, col=col, unit=unit, alt=alt, line=line, solid=solid);
ldraw_lib__stud(line=0.2);
// file: ../p/box5.scad
use <../lib.scad>
function ldraw_lib__box5() = [
// 0 Box with 5 Faces and All Edges
// 0 Name: box5.dat
// 0 Author: James Jessiman
// 0 !LDRAW_ORG Primitive UPDATE 2012-01
// 0 !LICENSE Licensed under CC BY 2.0 and CC BY 4.0 : see CAreadme.txt
// 
// 0 BFC CERTIFY CCW
  [0,"BFC","CERTIFY"],
  [0,"BFC","CCW"],
// 
// 0 !HISTORY 2002-04-03 [sbliss] Modified for BFC compliance
// 0 !HISTORY 2002-04-25 [PTadmin] Official Update 2002-02
// 0 !HISTORY 2007-06-24 [PTadmin] Header formatted for Contributor Agreement
// 0 !HISTORY 2008-07-01 [PTadmin] Official Update 2008-01
// 0 !HISTORY 2012-02-16 [Philo] Changed to CCW
// 0 !HISTORY 2012-03-30 [PTadmin] Official Update 2012-01
// 
// 
// 2 24 1 1 1 -1 1 1
  [2,24,1,1,1,-1,1,1],
// 2 24 -1 1 1 -1 1 -1
  [2,24,-1,1,1,-1,1,-1],
// 2 24 -1 1 -1 1 1 -1
  [2,24,-1,1,-1,1,1,-1],
// 2 24 1 1 -1 1 1 1
  [2,24,1,1,-1,1,1,1],
// 2 24 1 0 1 -1 0 1
  [2,24,1,0,1,-1,0,1],
// 2 24 -1 0 1 -1 0 -1
  [2,24,-1,0,1,-1,0,-1],
// 2 24 -1 0 -1 1 0 -1
  [2,24,-1,0,-1,1,0,-1],
// 2 24 1 0 -1 1 0 1
  [2,24,1,0,-1,1,0,1],
// 2 24 1 0 1 1 1 1
  [2,24,1,0,1,1,1,1],
// 2 24 -1 0 1 -1 1 1
  [2,24,-1,0,1,-1,1,1],
// 2 24 1 0 -1 1 1 -1
  [2,24,1,0,-1,1,1,-1],
// 2 24 -1 0 -1 -1 1 -1
  [2,24,-1,0,-1,-1,1,-1],
// 4 16 -1 1 1 1 1 1 1 1 -1 -1 1 -1
  [4,16,-1,1,1,1,1,1,1,1,-1,-1,1,-1],
// 4 16 -1 1 1 -1 0 1 1 0 1 1 1 1
  [4,16,-1,1,1,-1,0,1,1,0,1,1,1,1],
// 4 16 -1 1 -1 -1 0 -1 -1 0 1 -1 1 1
  [4,16,-1,1,-1,-1,0,-1,-1,0,1,-1,1,1],
// 4 16 1 1 -1 1 0 -1 -1 0 -1 -1 1 -1
  [4,16,1,1,-1,1,0,-1,-1,0,-1,-1,1,-1],
// 4 16 1 1 1 1 0 1 1 0 -1 1 1 -1
  [4,16,1,1,1,1,0,1,1,0,-1,1,1,-1],
];
makepoly(ldraw_lib__box5(), line=0.2);
// file: 3020.scad
use <../lib.scad>
use <../p/box5.scad>
use <../p/stud.scad>
use <../p/stud4.scad>
function ldraw_lib__3020() = [
// 0 Plate  2 x  4
// 0 Name: 3020.dat
// 0 Author: James Jessiman
// 0 !LDRAW_ORG Part UPDATE 2002-03
// 0 !LICENSE Licensed under CC BY 4.0 : see CAreadme.txt
// 
// 0 BFC CERTIFY CCW
  [0,"BFC","CERTIFY"],
  [0,"BFC","CCW"],
// 
// 0 !HISTORY 2001-10-26 [PTadmin] Official Update 2001-01
// 0 !HISTORY 2002-05-07 {unknown} BFC Certification
// 0 !HISTORY 2002-06-11 [PTadmin] Official Update 2002-03
// 0 !HISTORY 2007-06-07 [PTadmin] Header formatted for Contributor Agreement
// 0 !HISTORY 2008-07-01 [PTadmin] Official Update 2008-01
// 
// 
// 1 16 20 4 0 1 0 0 0 -1 0 0 0 1 stud4.dat
  [1,16,20,4,0,1,0,0,0,-1,0,0,0,1, ldraw_lib__stud4()],
// 1 16 0 4 0 1 0 0 0 -1 0 0 0 1 stud4.dat
  [1,16,0,4,0,1,0,0,0,-1,0,0,0,1, ldraw_lib__stud4()],
// 1 16 -20 4 0 1 0 0 0 -1 0 0 0 1 stud4.dat
  [1,16,-20,4,0,1,0,0,0,-1,0,0,0,1, ldraw_lib__stud4()],
// 
// 0 BFC INVERTNEXT
  [0,"BFC","INVERTNEXT"],
// 1 16 0 8 0 36 0 0 0 -4 0 0 0 16 box5.dat
  [1,16,0,8,0,36,0,0,0,-4,0,0,0,16, ldraw_lib__box5()],
// 
// 4 16 40 8 20 36 8 16 -36 8 16 -40 8 20
  [4,16,40,8,20,36,8,16,-36,8,16,-40,8,20],
// 0 Next Line was 4 16 40 8 -20 36 8 -16 -36 8 -16 -40 8 -20
// 4 16 -40 8 -20 -36 8 -16 36 8 -16 40 8 -20
  [4,16,-40,8,-20,-36,8,-16,36,8,-16,40,8,-20],
// 0 Next Line was 4 16 40 8 20 36 8 16 36 8 -16 40 8 -20
// 4 16 40 8 -20 36 8 -16 36 8 16 40 8 20
  [4,16,40,8,-20,36,8,-16,36,8,16,40,8,20],
// 4 16 -40 8 20 -36 8 16 -36 8 -16 -40 8 -20
  [4,16,-40,8,20,-36,8,16,-36,8,-16,-40,8,-20],
// 
// 1 16 0 8 0 40 0 0 0 -8 0 0 0 20 box5.dat
  [1,16,0,8,0,40,0,0,0,-8,0,0,0,20, ldraw_lib__box5()],
// 
// 1 16 30 0 10 1 0 0 0 1 0 0 0 1 stud.dat
  [1,16,30,0,10,1,0,0,0,1,0,0,0,1, ldraw_lib__stud()],
// 1 16 10 0 10 1 0 0 0 1 0 0 0 1 stud.dat
  [1,16,10,0,10,1,0,0,0,1,0,0,0,1, ldraw_lib__stud()],
// 1 16 -10 0 10 1 0 0 0 1 0 0 0 1 stud.dat
  [1,16,-10,0,10,1,0,0,0,1,0,0,0,1, ldraw_lib__stud()],
// 1 16 -30 0 10 1 0 0 0 1 0 0 0 1 stud.dat
  [1,16,-30,0,10,1,0,0,0,1,0,0,0,1, ldraw_lib__stud()],
// 1 16 30 0 -10 1 0 0 0 1 0 0 0 1 stud.dat
  [1,16,30,0,-10,1,0,0,0,1,0,0,0,1, ldraw_lib__stud()],
// 1 16 10 0 -10 1 0 0 0 1 0 0 0 1 stud.dat
  [1,16,10,0,-10,1,0,0,0,1,0,0,0,1, ldraw_lib__stud()],
// 1 16 -10 0 -10 1 0 0 0 1 0 0 0 1 stud.dat
  [1,16,-10,0,-10,1,0,0,0,1,0,0,0,1, ldraw_lib__stud()],
// 1 16 -30 0 -10 1 0 0 0 1 0 0 0 1 stud.dat
  [1,16,-30,0,-10,1,0,0,0,1,0,0,0,1, ldraw_lib__stud()],
// 0
];
module ldraw_lib__3020(step=0, col=false, unit=2/5, alt=false, line=0.2, solid=!$preview)
    makepoly(ldraw_lib__3020(), step=step, col=col, unit=unit, alt=alt, line=line, solid=solid);
ldraw_lib__3020(line=0.2);
// main file
use <../lib.scad>
use <3020.scad>
function ldraw_lib__302021() = [
// 0 ~_Plate  2 x  4 Red (Obsolete)
// 0 Name: 302021.dat
// 0 Author: Michael Heidemann [mikeheide]
// 0 !LDRAW_ORG Part Physical_Colour UPDATE 2019-02
// 0 !LICENSE Licensed under CC BY 4.0 : see CAreadme.txt
// 
// 0 BFC CERTIFY CCW
  [0,"BFC","CERTIFY"],
  [0,"BFC","CCW"],
// 
// 0 !CATEGORY Obsolete
// 
// 0 !HISTORY 2010-12-31 [PTadmin] Official Update 2010-03
// 0 !HISTORY 2019-07-19 [Holly-Wood] Obsoleted per decision not to include physical colour parts
// 0 !HISTORY 2019-09-09 [PTadmin] Official Update 2019-02
// 
// 
// 0 // This file is a "shortcut" with the correct number for the actual
// 0 // colouring of the part (Red).
// 
// 1 4 0 0 0 1 0 0 0 1 0 0 0 1 3020.dat
  [1,4,0,0,0,1,0,0,0,1,0,0,0,1, ldraw_lib__3020()],
];
module ldraw_lib__302021(step=0, col=false, unit=2/5, alt=false, line=0.2, solid=!$preview)
    makepoly(ldraw_lib__302021(), step=step, col=col, unit=unit, alt=alt, line=line, solid=solid);
ldraw_lib__302021(line=0.2);
